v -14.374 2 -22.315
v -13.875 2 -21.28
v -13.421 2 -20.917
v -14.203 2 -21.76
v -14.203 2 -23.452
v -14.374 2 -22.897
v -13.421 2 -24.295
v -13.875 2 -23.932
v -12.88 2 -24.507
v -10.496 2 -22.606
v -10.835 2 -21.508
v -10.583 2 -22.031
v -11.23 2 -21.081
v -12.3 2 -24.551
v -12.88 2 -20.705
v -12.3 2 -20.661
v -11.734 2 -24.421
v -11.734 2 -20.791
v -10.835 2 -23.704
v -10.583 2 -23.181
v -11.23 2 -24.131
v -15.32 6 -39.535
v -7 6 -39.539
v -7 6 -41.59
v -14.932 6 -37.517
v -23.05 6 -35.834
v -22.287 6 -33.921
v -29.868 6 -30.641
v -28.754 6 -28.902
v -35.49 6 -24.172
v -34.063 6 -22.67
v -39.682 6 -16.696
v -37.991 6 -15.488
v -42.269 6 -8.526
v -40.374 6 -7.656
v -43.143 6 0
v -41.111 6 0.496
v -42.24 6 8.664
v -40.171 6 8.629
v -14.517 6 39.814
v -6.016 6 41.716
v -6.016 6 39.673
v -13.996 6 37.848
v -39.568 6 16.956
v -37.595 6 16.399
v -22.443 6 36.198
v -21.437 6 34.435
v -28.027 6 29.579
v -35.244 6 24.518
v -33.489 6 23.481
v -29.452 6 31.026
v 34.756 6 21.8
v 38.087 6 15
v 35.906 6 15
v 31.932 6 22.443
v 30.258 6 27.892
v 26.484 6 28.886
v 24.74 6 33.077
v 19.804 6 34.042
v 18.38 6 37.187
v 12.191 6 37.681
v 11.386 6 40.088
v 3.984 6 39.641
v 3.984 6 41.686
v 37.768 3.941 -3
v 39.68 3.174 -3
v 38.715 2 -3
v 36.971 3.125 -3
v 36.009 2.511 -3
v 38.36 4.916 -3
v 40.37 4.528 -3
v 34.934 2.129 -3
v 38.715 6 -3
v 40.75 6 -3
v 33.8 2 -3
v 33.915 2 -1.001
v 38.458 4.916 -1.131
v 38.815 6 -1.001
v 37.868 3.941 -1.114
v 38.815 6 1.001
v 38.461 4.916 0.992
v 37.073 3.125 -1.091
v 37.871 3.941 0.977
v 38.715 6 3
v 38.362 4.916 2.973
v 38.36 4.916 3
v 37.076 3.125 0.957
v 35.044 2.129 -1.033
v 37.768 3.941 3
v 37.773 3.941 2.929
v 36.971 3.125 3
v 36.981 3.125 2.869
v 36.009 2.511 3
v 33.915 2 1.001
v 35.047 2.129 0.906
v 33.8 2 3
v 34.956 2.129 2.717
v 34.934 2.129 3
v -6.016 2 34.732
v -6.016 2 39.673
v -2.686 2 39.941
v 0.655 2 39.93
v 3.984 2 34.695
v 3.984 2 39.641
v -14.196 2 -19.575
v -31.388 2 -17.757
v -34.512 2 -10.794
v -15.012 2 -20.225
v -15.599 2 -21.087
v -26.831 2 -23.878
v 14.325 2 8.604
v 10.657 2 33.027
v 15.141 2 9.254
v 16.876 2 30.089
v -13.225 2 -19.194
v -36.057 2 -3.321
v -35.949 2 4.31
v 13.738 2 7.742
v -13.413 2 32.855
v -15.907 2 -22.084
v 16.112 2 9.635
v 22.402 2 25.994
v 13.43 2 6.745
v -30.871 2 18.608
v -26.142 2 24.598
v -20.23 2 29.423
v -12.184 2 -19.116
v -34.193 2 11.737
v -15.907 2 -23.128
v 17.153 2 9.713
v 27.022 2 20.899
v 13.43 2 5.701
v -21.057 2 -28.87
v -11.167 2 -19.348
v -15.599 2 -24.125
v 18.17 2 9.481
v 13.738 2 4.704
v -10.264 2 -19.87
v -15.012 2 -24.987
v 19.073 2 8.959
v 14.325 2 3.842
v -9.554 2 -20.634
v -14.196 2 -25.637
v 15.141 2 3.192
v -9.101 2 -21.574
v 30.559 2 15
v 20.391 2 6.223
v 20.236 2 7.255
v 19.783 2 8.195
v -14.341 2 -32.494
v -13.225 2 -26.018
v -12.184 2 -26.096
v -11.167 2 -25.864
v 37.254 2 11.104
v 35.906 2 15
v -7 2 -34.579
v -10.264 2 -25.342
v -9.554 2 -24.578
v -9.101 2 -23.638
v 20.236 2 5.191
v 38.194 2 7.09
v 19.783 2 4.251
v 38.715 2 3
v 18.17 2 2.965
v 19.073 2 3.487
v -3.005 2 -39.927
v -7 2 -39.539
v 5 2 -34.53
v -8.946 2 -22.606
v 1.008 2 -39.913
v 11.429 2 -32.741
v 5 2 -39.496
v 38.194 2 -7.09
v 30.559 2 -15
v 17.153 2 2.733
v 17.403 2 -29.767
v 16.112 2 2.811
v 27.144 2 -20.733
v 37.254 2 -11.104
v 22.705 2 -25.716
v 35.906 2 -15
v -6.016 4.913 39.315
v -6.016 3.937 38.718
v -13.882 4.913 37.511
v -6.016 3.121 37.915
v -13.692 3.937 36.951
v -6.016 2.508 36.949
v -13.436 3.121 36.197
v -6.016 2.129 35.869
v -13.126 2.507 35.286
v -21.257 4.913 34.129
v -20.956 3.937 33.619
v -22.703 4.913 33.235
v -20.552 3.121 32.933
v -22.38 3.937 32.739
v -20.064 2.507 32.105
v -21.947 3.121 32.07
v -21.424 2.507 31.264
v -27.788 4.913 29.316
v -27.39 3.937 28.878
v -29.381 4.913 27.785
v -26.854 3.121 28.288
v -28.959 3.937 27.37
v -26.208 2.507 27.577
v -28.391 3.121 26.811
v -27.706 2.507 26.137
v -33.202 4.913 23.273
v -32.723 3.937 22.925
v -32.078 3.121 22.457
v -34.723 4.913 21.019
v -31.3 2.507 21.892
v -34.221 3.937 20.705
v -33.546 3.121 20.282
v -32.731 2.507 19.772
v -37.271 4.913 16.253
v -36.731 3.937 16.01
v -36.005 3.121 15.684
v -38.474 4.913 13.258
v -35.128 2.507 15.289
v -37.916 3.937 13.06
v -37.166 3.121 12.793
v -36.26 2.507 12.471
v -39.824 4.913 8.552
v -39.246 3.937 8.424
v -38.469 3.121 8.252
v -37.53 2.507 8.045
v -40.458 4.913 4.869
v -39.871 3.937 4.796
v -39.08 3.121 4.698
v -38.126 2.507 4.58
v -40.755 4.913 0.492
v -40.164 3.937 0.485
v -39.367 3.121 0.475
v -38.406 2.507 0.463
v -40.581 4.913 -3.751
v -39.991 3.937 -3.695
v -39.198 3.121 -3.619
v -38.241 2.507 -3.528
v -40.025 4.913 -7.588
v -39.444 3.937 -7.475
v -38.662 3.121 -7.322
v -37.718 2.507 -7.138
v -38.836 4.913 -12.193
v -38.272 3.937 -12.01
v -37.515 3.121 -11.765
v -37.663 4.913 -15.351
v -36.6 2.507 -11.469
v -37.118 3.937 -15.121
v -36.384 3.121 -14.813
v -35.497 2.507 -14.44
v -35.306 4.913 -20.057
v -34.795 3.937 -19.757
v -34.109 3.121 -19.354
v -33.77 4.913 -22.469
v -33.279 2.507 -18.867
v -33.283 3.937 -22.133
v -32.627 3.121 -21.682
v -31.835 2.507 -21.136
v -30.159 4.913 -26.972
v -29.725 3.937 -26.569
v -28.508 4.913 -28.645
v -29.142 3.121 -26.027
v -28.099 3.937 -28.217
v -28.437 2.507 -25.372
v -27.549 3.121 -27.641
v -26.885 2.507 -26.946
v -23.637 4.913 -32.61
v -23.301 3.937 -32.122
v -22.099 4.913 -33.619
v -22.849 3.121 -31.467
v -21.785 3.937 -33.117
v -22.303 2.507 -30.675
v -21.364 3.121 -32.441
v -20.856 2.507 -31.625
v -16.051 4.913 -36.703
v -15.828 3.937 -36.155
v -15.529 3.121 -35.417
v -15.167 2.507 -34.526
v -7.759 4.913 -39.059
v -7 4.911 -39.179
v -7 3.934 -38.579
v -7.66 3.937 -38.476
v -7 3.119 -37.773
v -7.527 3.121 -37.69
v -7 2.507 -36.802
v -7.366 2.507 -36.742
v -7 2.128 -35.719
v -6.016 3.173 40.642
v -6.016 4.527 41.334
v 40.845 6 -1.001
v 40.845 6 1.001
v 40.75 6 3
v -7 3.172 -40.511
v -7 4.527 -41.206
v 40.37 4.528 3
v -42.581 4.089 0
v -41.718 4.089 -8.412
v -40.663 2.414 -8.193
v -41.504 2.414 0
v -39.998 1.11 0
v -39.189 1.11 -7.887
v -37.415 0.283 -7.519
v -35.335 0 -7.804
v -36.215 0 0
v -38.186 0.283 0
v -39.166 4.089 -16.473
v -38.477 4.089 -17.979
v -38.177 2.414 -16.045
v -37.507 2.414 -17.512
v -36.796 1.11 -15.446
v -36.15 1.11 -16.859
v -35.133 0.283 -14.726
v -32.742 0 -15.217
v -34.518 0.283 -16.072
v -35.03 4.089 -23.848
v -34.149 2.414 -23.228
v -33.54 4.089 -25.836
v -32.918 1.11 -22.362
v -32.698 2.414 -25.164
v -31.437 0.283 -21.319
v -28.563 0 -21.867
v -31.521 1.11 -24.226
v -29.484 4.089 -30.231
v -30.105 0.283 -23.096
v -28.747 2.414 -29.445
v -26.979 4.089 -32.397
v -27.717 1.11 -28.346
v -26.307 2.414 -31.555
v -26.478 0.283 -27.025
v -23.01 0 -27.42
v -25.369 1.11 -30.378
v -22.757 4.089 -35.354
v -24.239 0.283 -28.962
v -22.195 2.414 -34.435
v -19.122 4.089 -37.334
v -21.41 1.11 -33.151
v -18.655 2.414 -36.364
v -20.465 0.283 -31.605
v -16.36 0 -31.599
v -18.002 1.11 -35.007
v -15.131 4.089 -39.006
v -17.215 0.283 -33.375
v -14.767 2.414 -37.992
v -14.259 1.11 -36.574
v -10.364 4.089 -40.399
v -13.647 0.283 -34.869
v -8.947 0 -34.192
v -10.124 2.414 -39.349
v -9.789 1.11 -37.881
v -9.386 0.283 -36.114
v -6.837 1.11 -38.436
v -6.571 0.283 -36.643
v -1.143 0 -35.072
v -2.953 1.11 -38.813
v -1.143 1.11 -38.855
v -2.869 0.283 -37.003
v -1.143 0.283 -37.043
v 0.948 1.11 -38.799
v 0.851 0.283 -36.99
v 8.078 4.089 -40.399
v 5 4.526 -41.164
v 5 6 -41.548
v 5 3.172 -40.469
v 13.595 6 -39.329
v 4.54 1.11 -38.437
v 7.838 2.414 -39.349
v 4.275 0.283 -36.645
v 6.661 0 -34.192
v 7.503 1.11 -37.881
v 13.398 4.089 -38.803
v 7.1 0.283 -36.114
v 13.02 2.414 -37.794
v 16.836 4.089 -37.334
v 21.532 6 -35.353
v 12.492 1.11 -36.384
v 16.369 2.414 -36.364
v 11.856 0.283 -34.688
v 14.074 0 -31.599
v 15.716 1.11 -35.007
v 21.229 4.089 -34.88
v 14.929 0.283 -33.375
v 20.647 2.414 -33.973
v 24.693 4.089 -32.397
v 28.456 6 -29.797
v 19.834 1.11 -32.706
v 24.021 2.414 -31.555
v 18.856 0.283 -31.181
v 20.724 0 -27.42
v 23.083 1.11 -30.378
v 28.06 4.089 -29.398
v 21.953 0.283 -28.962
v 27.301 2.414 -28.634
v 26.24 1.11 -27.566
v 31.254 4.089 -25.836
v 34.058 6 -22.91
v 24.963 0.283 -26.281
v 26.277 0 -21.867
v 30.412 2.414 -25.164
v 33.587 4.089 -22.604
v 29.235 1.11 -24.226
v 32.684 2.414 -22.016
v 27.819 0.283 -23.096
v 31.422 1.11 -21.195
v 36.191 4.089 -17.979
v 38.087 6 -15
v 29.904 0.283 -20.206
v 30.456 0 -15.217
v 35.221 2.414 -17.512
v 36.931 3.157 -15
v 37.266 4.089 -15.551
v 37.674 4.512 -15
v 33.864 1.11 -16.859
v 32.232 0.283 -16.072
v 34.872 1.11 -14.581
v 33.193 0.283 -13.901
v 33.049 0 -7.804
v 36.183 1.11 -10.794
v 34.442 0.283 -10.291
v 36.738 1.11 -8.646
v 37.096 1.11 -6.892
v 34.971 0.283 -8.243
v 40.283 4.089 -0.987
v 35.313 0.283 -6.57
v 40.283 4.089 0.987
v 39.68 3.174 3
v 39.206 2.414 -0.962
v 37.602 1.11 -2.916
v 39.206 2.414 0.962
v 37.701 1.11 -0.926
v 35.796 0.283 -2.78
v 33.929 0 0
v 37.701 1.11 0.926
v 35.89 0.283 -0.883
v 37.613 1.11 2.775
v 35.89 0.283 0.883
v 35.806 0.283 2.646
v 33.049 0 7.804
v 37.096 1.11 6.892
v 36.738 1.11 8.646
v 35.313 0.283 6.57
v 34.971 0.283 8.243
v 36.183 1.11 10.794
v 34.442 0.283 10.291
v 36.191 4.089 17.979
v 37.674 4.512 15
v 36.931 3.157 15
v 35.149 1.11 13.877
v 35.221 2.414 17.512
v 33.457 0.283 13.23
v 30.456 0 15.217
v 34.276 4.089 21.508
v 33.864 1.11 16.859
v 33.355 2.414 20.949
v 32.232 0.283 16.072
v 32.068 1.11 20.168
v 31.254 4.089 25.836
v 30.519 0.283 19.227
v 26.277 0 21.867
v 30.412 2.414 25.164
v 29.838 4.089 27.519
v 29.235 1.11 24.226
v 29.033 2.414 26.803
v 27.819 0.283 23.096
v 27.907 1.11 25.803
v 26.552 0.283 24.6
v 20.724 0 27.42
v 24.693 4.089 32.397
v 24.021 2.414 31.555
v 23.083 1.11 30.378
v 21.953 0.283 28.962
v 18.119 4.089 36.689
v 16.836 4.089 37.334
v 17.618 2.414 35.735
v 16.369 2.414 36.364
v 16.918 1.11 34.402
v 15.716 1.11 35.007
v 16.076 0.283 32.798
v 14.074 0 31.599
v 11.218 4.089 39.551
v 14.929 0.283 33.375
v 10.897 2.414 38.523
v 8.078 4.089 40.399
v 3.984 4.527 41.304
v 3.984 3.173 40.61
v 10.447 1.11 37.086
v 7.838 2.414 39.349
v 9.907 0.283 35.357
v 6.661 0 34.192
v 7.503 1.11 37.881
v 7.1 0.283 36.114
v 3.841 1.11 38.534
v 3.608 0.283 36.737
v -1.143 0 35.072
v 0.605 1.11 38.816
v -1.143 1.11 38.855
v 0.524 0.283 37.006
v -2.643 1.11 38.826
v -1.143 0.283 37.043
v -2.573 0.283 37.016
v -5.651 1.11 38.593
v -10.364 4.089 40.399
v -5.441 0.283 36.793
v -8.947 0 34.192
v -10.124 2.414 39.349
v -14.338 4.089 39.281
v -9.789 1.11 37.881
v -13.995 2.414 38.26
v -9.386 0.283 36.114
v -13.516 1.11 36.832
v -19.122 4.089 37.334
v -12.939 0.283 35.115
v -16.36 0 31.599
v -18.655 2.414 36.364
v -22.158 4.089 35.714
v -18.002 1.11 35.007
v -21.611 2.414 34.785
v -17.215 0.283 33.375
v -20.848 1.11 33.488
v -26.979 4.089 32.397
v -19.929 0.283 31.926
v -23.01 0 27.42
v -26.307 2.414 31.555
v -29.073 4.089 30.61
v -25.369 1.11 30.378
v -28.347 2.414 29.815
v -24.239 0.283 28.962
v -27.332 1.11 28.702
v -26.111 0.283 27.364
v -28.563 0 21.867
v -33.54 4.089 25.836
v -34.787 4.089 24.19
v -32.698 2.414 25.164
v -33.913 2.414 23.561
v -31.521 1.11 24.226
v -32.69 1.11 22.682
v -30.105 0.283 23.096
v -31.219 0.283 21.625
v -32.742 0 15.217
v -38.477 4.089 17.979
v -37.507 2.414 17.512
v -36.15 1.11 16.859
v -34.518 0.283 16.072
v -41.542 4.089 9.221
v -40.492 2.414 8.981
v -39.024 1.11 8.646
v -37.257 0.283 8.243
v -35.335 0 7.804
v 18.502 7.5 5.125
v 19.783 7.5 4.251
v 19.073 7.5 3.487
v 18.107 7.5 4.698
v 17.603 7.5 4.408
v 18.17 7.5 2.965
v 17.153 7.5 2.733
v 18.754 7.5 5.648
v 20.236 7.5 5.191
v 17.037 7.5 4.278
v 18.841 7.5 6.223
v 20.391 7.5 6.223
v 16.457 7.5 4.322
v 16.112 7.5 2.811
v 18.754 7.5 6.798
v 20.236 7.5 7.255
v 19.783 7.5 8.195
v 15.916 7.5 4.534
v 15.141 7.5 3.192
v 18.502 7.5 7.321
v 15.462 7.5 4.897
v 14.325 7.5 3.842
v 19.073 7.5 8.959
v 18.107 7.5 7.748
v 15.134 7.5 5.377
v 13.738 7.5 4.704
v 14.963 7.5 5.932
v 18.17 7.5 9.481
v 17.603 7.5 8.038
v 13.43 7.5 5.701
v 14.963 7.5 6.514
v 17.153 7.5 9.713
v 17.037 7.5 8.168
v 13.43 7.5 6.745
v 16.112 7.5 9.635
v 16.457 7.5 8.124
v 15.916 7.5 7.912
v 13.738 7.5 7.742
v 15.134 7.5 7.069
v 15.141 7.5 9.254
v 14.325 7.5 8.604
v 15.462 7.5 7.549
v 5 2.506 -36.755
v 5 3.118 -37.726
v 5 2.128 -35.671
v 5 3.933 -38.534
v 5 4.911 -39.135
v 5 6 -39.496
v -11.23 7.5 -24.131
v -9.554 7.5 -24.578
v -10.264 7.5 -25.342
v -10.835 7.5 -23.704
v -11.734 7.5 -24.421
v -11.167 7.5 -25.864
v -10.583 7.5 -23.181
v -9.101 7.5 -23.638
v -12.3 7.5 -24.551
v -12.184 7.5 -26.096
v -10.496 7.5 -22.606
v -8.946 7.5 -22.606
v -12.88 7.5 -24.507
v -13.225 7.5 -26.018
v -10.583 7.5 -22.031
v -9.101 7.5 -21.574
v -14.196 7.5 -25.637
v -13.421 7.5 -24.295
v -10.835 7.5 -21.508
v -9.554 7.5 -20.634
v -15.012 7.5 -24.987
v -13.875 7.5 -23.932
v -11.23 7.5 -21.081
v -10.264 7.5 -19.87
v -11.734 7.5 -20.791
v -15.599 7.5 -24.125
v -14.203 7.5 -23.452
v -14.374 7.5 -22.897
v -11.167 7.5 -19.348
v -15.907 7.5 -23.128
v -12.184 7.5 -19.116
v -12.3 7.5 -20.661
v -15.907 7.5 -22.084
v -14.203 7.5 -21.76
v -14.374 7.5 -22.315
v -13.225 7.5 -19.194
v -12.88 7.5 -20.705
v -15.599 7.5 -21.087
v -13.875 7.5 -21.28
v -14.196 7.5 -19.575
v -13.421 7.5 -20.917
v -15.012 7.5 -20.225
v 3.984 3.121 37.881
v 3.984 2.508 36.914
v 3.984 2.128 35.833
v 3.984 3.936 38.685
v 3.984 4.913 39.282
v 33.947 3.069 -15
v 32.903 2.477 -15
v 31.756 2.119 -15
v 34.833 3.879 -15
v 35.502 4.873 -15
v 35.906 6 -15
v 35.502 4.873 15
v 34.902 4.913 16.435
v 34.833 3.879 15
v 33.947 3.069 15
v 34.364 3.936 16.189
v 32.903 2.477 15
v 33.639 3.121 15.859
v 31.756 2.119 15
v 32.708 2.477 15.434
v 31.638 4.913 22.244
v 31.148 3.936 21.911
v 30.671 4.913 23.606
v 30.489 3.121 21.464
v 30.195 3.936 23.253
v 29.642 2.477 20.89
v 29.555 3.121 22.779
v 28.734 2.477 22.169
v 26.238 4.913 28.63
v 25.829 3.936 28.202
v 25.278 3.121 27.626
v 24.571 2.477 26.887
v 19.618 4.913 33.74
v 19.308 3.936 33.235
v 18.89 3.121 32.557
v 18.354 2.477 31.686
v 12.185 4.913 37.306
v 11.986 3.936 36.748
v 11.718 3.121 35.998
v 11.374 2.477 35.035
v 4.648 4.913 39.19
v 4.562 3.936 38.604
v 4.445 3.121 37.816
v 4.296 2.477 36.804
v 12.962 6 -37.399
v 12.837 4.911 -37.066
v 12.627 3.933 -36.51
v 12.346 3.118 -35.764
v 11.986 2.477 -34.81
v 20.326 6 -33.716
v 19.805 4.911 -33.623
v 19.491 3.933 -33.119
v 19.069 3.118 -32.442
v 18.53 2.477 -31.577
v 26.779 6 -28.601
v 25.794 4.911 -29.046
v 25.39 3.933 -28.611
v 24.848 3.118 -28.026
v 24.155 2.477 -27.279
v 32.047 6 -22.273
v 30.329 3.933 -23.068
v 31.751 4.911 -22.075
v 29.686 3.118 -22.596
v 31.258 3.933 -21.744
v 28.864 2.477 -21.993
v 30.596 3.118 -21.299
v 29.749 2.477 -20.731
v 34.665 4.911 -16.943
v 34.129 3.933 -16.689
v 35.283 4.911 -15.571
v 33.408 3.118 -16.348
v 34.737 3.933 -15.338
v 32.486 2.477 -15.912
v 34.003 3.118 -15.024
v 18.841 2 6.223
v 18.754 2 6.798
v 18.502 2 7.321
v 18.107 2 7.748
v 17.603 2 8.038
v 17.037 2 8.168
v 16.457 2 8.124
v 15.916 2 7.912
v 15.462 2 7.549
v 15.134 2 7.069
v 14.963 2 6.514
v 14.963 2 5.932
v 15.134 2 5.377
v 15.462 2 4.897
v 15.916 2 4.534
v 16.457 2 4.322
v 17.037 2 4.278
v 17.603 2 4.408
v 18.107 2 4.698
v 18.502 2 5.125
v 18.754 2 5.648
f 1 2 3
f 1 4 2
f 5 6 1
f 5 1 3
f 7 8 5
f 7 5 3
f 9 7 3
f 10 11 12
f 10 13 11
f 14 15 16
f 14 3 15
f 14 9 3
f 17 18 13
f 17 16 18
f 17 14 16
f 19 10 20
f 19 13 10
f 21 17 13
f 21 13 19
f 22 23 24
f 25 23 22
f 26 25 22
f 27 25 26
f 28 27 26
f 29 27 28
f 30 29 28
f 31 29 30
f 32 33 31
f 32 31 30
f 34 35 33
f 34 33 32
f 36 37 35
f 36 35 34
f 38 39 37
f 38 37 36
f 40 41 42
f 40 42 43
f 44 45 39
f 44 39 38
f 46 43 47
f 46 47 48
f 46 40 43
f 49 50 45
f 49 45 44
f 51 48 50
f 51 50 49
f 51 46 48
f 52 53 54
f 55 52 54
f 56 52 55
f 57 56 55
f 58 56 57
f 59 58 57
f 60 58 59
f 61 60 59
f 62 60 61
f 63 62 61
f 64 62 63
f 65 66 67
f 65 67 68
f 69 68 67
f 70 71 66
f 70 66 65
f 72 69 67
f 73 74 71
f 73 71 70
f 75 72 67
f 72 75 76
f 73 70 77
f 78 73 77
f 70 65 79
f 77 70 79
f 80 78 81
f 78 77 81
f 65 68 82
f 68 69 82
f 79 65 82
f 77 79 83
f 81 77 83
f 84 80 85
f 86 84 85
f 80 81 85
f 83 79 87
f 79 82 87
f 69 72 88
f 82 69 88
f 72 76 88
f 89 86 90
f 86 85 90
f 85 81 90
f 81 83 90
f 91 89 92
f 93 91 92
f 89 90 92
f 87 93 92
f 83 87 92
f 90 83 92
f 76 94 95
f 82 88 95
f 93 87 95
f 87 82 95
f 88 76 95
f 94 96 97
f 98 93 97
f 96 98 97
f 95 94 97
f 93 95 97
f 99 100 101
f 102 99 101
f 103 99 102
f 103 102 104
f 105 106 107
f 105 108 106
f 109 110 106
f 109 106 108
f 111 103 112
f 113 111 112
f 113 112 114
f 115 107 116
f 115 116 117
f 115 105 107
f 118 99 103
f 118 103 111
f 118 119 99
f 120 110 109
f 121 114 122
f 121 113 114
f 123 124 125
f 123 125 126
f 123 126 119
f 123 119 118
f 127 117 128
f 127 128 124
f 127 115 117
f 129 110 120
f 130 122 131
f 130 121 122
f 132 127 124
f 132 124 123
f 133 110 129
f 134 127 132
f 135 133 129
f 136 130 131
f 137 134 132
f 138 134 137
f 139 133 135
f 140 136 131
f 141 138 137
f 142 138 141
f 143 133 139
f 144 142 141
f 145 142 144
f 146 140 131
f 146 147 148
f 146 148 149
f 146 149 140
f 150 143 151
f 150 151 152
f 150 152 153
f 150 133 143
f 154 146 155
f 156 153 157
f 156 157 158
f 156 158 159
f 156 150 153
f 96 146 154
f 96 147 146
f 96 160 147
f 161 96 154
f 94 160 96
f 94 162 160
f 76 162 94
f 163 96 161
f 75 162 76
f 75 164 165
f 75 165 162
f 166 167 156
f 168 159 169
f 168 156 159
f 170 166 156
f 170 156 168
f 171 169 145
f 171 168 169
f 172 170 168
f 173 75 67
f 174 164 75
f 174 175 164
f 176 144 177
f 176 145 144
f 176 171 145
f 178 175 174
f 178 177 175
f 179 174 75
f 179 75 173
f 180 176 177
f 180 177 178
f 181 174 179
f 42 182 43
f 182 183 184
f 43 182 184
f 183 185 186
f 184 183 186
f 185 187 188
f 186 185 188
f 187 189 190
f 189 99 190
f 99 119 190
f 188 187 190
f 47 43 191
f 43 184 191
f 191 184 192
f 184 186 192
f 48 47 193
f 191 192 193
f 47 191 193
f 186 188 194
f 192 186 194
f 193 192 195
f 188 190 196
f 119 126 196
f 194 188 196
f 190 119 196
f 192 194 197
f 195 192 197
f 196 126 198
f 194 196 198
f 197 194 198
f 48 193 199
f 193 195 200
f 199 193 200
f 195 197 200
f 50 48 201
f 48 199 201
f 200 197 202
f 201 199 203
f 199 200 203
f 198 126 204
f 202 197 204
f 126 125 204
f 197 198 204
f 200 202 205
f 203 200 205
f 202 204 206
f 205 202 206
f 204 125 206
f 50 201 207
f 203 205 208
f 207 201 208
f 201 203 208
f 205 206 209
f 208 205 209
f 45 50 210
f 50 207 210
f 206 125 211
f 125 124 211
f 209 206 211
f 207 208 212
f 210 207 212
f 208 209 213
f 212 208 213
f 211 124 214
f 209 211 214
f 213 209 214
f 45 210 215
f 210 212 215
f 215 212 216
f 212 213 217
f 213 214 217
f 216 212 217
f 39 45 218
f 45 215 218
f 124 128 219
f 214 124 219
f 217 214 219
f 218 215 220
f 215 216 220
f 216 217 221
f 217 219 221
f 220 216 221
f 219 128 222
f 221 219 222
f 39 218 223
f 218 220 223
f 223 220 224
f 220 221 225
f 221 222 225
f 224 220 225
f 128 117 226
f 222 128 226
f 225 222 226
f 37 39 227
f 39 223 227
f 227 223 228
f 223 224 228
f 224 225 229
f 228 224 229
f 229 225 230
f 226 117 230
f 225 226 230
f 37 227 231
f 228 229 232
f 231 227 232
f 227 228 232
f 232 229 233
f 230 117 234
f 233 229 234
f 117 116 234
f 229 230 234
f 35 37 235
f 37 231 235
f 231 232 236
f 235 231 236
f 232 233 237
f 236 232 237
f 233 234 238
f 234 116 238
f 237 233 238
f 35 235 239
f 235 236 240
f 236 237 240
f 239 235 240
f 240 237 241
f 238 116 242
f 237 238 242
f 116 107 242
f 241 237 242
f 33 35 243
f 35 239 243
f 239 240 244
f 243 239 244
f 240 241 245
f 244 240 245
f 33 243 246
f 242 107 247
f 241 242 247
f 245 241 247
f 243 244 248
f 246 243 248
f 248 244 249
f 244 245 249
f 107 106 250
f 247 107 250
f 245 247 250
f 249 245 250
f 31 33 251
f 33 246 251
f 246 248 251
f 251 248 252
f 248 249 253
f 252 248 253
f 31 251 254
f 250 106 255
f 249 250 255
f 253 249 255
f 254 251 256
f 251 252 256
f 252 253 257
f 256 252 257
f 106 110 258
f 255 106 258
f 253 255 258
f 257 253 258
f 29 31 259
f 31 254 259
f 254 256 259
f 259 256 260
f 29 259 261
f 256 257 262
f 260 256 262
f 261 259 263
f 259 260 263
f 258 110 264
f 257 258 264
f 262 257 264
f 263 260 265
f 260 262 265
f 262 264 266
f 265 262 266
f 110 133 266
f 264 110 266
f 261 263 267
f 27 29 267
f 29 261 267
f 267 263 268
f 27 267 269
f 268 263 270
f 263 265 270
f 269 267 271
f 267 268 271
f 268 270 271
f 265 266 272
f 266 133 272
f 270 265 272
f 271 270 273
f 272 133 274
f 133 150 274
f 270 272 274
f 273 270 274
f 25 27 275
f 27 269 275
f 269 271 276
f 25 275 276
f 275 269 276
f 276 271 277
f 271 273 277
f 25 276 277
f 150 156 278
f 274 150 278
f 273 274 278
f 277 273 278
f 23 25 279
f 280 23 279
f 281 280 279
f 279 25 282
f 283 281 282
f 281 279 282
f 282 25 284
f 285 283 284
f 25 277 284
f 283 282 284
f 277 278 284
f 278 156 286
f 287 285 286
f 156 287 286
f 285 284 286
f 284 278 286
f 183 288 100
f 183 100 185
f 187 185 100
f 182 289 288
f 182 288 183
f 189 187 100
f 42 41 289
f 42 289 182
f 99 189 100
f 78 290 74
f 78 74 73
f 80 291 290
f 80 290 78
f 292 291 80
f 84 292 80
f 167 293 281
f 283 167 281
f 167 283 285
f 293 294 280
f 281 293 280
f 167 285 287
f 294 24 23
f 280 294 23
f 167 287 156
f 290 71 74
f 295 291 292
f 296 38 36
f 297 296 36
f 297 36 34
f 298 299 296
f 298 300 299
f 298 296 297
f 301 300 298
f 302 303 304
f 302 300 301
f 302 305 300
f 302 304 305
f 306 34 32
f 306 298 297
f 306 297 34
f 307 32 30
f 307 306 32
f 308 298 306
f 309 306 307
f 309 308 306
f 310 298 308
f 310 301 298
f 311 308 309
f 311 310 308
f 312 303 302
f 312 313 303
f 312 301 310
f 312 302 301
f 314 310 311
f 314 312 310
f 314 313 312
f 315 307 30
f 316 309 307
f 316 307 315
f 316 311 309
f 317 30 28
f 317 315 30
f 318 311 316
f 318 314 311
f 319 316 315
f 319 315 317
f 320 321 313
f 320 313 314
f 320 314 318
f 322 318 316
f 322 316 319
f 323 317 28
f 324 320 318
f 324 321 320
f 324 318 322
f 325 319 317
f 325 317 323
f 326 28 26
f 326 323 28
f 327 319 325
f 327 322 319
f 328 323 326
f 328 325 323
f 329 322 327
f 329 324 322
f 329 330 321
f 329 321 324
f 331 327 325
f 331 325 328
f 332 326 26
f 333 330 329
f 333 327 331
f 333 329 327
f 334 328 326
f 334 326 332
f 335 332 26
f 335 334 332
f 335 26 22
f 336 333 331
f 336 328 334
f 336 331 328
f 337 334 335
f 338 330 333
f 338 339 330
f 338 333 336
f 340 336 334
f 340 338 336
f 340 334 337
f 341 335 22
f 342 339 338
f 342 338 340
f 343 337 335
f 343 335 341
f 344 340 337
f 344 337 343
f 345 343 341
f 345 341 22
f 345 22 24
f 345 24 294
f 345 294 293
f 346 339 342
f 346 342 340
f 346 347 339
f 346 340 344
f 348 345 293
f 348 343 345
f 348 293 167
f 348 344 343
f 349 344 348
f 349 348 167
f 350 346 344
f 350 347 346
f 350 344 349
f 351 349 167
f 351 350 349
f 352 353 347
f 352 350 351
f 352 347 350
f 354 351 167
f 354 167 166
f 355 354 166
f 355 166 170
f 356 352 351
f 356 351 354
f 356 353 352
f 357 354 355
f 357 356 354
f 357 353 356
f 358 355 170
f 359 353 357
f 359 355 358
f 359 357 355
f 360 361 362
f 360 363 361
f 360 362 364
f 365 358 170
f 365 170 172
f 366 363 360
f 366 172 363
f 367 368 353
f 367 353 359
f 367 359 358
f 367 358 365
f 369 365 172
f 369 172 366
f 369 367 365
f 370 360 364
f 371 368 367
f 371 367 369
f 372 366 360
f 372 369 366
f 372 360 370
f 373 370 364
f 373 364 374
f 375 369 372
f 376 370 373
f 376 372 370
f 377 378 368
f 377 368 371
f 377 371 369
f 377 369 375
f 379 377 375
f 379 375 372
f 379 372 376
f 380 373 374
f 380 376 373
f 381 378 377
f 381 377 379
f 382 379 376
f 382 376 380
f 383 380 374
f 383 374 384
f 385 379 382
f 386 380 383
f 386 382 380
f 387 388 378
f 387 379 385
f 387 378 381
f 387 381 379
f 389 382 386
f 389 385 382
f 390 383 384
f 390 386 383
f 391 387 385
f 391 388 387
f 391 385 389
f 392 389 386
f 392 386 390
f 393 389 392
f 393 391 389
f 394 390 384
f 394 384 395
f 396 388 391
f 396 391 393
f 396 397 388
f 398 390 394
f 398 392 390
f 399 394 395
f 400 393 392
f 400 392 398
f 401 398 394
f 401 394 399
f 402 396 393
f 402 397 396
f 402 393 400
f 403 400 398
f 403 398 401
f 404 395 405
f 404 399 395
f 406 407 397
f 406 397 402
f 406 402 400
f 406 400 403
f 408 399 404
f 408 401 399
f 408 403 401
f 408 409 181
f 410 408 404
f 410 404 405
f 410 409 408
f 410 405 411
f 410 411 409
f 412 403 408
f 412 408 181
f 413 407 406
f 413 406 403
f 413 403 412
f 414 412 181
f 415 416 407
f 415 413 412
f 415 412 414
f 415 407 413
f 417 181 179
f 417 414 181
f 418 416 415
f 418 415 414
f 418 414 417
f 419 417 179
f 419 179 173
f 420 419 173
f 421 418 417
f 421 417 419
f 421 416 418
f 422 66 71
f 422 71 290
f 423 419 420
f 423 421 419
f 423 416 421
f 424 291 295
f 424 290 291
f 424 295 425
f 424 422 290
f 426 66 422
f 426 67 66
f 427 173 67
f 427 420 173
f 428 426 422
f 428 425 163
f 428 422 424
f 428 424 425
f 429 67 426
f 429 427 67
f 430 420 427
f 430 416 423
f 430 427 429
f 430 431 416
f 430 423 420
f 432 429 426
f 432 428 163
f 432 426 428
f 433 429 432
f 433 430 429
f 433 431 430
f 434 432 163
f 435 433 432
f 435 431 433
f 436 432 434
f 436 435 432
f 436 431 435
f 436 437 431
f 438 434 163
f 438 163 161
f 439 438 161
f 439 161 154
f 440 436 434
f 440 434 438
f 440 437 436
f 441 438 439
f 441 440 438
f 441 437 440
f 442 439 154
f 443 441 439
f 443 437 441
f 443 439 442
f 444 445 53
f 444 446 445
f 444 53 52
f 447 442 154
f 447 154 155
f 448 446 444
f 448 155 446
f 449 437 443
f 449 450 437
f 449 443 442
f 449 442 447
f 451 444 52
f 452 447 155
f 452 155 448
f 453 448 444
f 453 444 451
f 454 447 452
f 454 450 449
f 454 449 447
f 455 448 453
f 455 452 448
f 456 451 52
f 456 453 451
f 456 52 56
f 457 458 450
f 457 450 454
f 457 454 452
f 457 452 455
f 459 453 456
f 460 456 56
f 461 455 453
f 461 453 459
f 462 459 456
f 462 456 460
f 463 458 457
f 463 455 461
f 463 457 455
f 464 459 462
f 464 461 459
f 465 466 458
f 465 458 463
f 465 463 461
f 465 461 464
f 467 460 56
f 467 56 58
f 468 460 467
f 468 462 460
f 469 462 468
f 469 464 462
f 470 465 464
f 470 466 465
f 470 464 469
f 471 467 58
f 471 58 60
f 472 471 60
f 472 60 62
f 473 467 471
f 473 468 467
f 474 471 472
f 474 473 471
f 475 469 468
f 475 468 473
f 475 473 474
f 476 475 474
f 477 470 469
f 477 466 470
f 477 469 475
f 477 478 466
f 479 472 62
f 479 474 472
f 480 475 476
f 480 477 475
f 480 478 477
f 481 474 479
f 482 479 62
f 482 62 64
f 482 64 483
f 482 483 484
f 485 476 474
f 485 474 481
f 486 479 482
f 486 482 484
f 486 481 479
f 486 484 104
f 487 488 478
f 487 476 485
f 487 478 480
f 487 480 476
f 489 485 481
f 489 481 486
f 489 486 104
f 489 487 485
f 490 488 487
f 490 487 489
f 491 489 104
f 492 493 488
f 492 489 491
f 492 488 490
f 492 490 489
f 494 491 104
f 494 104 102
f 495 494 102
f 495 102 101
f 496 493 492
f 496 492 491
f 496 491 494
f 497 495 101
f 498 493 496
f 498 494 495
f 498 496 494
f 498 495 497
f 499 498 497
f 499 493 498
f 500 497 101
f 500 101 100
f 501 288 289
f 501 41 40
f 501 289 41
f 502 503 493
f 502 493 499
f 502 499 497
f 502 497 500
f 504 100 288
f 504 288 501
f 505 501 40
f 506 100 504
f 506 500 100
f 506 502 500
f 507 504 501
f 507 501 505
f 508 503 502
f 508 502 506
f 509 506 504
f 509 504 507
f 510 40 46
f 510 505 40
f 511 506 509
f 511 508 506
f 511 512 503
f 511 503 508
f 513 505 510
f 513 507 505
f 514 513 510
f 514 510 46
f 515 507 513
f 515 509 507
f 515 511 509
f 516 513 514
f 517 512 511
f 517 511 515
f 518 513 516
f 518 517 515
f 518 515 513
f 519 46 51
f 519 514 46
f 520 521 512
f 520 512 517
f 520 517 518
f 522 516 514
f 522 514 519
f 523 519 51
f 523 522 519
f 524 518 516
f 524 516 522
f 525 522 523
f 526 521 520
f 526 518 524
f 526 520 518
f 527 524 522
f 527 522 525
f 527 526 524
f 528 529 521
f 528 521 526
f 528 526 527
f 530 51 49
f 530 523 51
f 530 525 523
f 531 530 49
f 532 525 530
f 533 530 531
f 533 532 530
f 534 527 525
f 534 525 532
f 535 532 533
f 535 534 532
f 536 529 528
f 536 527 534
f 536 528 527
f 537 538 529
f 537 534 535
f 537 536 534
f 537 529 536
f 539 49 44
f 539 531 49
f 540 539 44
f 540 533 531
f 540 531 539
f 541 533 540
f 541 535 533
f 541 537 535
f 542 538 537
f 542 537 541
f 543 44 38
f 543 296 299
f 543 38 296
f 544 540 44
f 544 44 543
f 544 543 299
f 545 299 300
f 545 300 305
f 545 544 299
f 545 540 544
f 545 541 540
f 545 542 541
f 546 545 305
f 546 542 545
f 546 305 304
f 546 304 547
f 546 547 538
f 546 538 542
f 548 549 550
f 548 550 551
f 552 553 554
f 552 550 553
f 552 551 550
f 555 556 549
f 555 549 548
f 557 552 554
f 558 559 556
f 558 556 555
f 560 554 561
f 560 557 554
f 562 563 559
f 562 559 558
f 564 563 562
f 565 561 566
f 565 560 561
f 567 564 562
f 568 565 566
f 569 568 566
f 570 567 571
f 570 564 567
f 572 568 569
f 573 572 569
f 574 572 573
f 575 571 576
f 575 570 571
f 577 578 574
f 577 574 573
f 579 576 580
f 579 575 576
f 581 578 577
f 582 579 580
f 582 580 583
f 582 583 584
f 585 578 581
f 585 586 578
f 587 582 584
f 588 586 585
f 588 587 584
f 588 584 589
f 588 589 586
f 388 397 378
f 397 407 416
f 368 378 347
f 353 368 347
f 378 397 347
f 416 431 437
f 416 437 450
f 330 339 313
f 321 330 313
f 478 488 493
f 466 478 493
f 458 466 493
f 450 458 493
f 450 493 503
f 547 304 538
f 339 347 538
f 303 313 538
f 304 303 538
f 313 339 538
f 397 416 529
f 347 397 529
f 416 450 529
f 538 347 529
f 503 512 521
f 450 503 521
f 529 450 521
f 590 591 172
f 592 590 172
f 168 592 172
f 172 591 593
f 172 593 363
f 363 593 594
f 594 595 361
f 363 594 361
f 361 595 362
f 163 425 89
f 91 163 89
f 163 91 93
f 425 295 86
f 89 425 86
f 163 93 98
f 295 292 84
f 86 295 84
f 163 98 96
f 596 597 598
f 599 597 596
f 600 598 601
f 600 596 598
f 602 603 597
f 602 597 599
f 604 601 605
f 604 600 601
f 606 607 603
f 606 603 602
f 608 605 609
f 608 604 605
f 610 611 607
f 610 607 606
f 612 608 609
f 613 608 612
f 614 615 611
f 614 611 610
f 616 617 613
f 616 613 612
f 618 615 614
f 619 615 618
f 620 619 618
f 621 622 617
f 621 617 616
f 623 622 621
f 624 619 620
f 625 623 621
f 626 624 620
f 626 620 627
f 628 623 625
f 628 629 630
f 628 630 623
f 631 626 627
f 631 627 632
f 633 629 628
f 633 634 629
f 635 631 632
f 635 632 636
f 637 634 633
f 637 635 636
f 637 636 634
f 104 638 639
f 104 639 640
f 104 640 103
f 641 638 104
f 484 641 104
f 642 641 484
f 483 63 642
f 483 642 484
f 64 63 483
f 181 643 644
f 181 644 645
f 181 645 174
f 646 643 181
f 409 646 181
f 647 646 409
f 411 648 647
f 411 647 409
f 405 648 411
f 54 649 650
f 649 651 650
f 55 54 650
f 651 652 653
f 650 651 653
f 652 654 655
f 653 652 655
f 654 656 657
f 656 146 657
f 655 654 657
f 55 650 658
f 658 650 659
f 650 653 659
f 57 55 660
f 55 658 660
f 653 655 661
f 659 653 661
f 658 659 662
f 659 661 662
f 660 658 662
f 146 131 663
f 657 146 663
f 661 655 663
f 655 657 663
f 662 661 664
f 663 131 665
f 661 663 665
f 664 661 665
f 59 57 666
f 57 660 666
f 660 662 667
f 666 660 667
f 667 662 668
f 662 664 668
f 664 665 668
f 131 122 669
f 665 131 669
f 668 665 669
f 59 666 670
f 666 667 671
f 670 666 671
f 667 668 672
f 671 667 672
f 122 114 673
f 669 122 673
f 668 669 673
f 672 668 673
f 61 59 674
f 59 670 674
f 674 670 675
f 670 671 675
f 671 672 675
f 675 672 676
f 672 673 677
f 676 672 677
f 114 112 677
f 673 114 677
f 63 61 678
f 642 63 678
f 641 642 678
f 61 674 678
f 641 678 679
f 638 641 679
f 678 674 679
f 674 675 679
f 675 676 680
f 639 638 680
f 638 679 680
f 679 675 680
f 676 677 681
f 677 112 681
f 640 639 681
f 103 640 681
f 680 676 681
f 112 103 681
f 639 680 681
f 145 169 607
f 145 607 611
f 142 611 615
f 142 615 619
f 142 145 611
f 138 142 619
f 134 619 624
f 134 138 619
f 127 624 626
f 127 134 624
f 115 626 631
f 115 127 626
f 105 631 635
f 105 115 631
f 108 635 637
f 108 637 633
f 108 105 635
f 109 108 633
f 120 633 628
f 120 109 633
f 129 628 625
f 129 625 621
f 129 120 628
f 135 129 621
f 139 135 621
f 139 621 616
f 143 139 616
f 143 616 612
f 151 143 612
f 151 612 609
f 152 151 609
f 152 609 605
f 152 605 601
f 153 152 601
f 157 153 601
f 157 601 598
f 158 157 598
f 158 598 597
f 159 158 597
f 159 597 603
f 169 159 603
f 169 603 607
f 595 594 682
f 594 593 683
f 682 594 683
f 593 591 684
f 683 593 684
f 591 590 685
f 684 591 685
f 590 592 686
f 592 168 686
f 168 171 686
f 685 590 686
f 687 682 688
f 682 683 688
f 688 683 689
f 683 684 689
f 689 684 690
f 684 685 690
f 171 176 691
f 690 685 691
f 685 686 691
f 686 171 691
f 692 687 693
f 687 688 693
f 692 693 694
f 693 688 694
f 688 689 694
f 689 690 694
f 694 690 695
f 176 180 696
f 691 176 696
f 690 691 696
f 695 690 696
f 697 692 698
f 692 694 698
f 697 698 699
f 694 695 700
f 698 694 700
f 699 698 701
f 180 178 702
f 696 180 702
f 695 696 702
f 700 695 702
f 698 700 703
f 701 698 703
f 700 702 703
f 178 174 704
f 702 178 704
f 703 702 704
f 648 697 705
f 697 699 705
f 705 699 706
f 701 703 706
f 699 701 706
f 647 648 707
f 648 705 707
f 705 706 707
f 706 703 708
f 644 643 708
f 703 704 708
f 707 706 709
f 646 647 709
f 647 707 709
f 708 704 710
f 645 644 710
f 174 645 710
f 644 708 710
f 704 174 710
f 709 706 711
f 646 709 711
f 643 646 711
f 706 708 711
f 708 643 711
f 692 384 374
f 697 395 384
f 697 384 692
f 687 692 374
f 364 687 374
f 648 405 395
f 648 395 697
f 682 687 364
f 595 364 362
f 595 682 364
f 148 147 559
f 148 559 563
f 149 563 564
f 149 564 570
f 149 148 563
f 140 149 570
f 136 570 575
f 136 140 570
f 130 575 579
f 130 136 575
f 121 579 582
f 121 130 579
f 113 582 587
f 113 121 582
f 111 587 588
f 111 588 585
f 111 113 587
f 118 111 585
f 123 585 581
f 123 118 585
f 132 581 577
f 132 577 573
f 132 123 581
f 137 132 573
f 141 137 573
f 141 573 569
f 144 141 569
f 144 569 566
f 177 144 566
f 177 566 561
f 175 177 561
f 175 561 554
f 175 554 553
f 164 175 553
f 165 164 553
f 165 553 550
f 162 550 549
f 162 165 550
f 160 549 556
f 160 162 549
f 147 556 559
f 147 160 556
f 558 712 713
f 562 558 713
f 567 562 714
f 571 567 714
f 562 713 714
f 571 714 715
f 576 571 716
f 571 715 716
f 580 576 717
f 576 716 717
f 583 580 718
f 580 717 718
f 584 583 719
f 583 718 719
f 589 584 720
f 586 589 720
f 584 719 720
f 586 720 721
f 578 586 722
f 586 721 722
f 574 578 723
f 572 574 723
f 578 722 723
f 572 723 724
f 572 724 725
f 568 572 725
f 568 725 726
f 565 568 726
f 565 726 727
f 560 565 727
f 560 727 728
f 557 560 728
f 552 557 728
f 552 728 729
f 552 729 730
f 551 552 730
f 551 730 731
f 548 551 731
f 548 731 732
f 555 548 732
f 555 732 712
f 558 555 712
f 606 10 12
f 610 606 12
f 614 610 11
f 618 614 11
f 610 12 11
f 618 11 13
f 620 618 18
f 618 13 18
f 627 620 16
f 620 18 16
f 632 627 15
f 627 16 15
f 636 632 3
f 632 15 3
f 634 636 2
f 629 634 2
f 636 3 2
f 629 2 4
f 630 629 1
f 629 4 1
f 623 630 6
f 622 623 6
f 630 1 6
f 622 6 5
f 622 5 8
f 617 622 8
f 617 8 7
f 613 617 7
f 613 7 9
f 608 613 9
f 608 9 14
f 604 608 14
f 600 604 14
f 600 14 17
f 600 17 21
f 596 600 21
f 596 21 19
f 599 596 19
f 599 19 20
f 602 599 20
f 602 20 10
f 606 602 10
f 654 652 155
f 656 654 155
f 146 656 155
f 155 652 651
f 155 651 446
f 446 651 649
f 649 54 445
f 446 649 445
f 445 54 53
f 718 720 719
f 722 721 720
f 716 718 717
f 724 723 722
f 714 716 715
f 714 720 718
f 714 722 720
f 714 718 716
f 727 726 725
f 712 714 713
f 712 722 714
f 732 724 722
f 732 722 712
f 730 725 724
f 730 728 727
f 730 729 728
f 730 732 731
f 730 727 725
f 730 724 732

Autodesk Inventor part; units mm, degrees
ref_plane "YZ Plane" through (0, 0, 0) normal (1, 0, 0) x (0, 1, 0)
ref_plane "XZ Plane" through (0, 0, 0) normal (0, 1, 0) x (-1, 0, 0)
ref_plane "XY Plane" through (0, 0, 0) normal (0, 0, 1) x (1, 0, 0)
sketch "Sketch1" plane through (0, 0, 0) normal (0, 1, 0) x (-1, 0, 0)
  circle A0 centre (1.143, 0) radius 39 construction
  circle A1 centre (1.143, 0) radius 42
  line L0 (-21.857, 14) -> (-36.857, 14) construction
  line L1 (-36.857, 14) -> (-36.857, 5) construction
  line L2 (-36.857, 5) -> (-21.857, 5) construction
  line L3 (-21.857, 5) -> (-21.857, 14) construction
  line L4 (1.143, 0) -> (-37.857, 0)
  line L5 (0, 0) -> (0, -22) construction
  dimension "d0" = 78
  dimension "d1" = 9
  dimension "d2" = 15
  dimension "d3" = 5
  dimension "d4" = 23
  dimension "d5" = 84
  dimension "d11" = 1.143
extrude "Extrusion1" add sketch "Sketch1" along normal blind 6
fillet "Fillet1" radius 7 1 edges at (40.857, 0, 0)
shell "Shell1" thickness 2 removed faces 1 at (-4.0377, 6, 12.235)
sketch "Sketch2" plane through (-1.143, 2, 0) normal (0, 1, 0) x (1, 0, 0)
  circle A0 centre (-11.303, -22.606) radius 1.95
  circle A1 centre (18.034, 6.223) radius 1.95
  circle A2 centre (-11.303, -22.606) radius 3.5
  circle A3 centre (18.034, 6.223) radius 3.5
  point P0 (1.143, 0)
  dimension "d12" = 3.9
  dimension "d13" = 3.9
  dimension "d14" = 6.223
  dimension "d15" = 16.891
  dimension "d16" = 22.606
  dimension "d17" = 12.446
  dimension "d18" = 7
  dimension "d19" = 7
extrude "Extrusion2" add sketch "Sketch2" along normal blind 5.5
sketch "Sketch3" plane through (-1.143, 2, 0) normal (0, 1, 0) x (1, 0, 0)
  line L0 (7.5, 19.5) -> (-25.5, 19.5) construction
  line L1 (-25.5, 19.5) -> (-25.5, -9.5) construction
  line L2 (-25.5, -9.5) -> (7.5, -9.5) construction
  line L3 (7.5, -9.5) -> (7.5, 19.5) construction
  line L4 (7.5, 19.5) -> (-25.5, -9.5) construction
  line L5 (-25.5, 19.5) -> (7.5, -9.5) construction
  point P0 (1.143, 0)
  point P1 (-9, 5)
  dimension "d22" = 33
  dimension "d23" = 29
sketch "Sketch5" plane through (-1.143, 6, 0) normal (0, 1, 0) x (1, 0, 0)
  line L0 (31.143, -15) -> (45, -15)
  line L1 (45, -15) -> (45, -3)
  line L2 (45, -3) -> (31.143, -3)
  line L3 (31.143, -3) -> (31.143, -15)
  line L4 (1.143, 0) -> (-32, 0) construction
  line L5 (31.143, 15) -> (45, 15)
  line L6 (45, 15) -> (45, 3)
  line L7 (45, 3) -> (31.143, 3)
  line L8 (31.143, 3) -> (31.143, 15)
  line L9 (-5.857, 30) -> (6.143, 30)
  line L10 (6.143, 30) -> (6.143, 46)
  line L11 (6.143, 46) -> (-5.857, 46)
  line L12 (-5.857, 46) -> (-5.857, 30)
  line L13 (-5.857, 30) -> (6.143, 46) construction
  line L14 (6.143, 30) -> (-5.857, 46) construction
  line L15 (-4.873, -22) -> (5.127, -22)
  line L16 (5.127, -22) -> (5.127, -44)
  line L17 (5.127, -44) -> (-4.873, -44)
  line L18 (-4.873, -44) -> (-4.873, -22)
  line L19 (-4.873, -22) -> (5.127, -44) construction
  line L20 (5.127, -22) -> (-4.873, -44) construction
  point P0 (0.143, 38)
  point P1 (0.127, -33)
  dimension "d24" = 3
  dimension "d25" = 12
  dimension "d26" = 30
  dimension "d29" = 1
  dimension "d30" = 12
  dimension "d31" = 1.016
  dimension "d32" = 10
extrude "Extrusion3" cut sketch "Sketch5" against normal up to surface (4 mm away)
mirror "Mirror1" about plane through (0, 0, 0) normal (0, 0, 1) of "Extrusion2"
sketch "Sketch6" plane through (-12.446, 7.5, 22.606) normal (0, 1, 0) x (1, 0, 0)
  circle A0 centre (0, 0) radius 4.9497
  circle A1 centre (29.337, 28.829) radius 1.95 projected
  circle A2 centre (29.337, 28.829) radius 4.3979
  point P0 (12.446, 22.606)
extrude "Extrusion4" cut sketch "Sketch6" against normal up to surface (5.5 mm away) contours A0 | A1 | A2
properties part number "Case top"
